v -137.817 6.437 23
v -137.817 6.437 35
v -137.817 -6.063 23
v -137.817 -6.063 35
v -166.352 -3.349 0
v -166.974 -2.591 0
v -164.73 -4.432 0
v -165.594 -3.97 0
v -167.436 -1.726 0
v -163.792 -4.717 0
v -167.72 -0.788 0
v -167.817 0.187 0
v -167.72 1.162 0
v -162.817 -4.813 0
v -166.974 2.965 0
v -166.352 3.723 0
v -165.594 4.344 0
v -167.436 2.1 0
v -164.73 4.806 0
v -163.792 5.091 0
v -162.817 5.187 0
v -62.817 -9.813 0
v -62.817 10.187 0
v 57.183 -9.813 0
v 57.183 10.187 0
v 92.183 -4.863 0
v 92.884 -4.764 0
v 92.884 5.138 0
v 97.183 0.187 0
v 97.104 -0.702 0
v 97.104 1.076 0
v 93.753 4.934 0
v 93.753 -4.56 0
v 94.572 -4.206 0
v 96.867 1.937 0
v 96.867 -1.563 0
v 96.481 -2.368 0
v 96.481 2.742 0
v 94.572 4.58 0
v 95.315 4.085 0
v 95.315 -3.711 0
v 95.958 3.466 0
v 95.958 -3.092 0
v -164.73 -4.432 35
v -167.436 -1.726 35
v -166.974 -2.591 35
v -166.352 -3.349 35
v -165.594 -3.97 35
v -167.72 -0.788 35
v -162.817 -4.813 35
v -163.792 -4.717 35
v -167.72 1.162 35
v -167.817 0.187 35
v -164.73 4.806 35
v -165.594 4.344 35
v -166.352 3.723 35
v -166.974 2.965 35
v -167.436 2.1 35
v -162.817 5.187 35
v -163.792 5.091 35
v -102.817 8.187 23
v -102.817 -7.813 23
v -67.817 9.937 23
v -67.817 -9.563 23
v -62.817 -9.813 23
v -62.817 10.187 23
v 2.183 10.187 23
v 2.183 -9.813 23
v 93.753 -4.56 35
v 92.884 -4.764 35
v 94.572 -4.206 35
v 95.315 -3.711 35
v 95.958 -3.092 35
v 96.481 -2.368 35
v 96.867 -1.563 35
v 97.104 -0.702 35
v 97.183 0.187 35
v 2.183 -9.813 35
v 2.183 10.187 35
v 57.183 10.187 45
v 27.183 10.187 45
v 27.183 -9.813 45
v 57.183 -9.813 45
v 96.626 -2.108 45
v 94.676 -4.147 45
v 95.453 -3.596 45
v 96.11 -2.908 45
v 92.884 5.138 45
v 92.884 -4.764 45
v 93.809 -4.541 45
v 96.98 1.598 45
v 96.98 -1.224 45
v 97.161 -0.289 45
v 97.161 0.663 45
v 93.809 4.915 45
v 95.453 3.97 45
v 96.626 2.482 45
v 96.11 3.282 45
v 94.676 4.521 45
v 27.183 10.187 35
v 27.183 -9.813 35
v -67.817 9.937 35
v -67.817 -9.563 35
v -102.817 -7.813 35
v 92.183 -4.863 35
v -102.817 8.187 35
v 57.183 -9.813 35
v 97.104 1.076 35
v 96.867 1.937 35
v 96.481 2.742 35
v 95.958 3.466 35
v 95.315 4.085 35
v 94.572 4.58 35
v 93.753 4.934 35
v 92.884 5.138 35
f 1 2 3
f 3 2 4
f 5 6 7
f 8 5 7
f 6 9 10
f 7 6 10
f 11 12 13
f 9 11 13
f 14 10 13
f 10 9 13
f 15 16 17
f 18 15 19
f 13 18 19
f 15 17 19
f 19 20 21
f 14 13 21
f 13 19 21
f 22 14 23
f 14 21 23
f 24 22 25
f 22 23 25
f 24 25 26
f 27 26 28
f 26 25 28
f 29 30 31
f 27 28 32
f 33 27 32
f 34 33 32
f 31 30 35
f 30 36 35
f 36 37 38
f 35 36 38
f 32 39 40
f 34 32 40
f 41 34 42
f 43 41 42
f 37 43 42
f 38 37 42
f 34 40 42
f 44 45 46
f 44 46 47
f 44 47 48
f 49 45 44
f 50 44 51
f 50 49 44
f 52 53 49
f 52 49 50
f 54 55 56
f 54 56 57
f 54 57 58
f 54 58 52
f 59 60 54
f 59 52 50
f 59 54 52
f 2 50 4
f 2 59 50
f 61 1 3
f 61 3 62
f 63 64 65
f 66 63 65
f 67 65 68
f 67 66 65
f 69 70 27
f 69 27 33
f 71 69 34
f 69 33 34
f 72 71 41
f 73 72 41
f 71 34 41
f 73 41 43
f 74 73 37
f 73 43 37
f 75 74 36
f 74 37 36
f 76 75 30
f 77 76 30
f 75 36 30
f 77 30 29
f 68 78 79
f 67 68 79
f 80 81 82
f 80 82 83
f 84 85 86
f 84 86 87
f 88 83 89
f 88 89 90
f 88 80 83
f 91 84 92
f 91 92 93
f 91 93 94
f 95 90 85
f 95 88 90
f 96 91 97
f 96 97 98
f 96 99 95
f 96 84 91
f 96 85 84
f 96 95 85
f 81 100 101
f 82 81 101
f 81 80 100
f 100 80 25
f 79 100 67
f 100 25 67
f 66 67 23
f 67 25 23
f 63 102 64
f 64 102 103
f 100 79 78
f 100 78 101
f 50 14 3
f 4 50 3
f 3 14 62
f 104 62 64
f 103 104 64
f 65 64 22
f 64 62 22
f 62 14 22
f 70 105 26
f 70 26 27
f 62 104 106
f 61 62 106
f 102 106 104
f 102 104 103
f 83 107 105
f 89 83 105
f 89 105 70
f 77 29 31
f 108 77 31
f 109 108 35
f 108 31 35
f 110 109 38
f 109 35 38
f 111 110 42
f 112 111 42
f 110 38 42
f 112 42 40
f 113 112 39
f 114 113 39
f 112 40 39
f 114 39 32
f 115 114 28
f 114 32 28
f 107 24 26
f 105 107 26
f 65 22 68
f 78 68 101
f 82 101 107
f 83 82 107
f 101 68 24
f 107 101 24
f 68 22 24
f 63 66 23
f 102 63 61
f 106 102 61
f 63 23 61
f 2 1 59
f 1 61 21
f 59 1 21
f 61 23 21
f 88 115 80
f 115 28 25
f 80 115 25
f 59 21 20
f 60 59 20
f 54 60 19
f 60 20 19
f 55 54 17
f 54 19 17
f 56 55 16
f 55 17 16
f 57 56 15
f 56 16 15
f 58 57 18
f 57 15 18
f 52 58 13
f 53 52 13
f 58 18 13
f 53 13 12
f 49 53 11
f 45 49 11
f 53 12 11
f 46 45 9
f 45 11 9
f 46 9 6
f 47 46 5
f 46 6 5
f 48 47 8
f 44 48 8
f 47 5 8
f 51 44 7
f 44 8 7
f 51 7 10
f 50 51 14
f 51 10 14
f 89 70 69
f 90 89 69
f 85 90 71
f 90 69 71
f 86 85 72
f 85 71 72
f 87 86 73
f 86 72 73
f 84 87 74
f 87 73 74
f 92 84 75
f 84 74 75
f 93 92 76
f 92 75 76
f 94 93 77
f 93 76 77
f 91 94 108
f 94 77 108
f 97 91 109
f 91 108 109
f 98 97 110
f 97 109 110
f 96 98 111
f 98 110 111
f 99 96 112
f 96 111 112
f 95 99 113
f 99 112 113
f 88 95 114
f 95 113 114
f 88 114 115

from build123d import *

# Parameters (mm, degrees)
F1_DEPTH = 35
F3_DEPTH = 10
F5_DEPTH = 12
F6_DEPTH = 12


with BuildPart() as f1:
    # F0 (on Top) → F1 (new body)
    with BuildSketch(Plane.XY):
        with BuildLine():
            Line((-62.8165142711, -9.8129920568), (57.1834857289, -9.8129920568))
            Line((57.1834857289, -9.8129920568), (92.1834857289, -4.8627543336))
            Line((92.1834857289, -4.8627543336), (92.8836937573, -4.7637201565))
            ThreePointArc((92.8836937573, -4.7637201565), (95.958471831, -3.0916320079), (97.1834857289, 0.1870079432))
            ThreePointArc((97.1834857289, 0.1870079432), (95.958471831, 3.4656478942), (92.8836937573, 5.1377360428))
            Line((92.8836937573, 5.1377360428), (57.1834857289, 10.1870079432))
            Line((57.1834857289, 10.1870079432), (-62.8165142711, 10.1870079432))
            Line((-62.8165142711, 10.1870079432), (-162.8165142711, 5.1870079432))
            ThreePointArc((-162.8165142711, 5.1870079432), (-167.8165142711, 0.1870079432), (-162.8165142711, -4.8129920568))
            Line((-162.8165142711, -4.8129920568), (-62.8165142711, -9.8129920568))
        make_face()
    extrude(amount=F1_DEPTH)

    # F2 (on face) → F3 (join)
    with BuildSketch(Plane.XY.offset(35)):
        with BuildLine():
            Line((57.1834857289, 10.1870079432), (27.1834857289, 10.1870079432))
            Line((27.1834857289, 10.1870079432), (27.1834857289, -9.8129920568))
            Line((27.1834857289, -9.8129920568), (57.1834857289, -9.8129920568))
            Line((57.1834857289, -9.8129920568), (92.8836937573, -4.7637201565))
            ThreePointArc((92.8836937573, -4.7637201565), (97.1834857289, 0.1870079432), (92.8836937573, 5.1377360428))
            Line((92.8836937573, 5.1377360428), (57.1834857289, 10.1870079432))
        make_face()
    extrude(amount=F3_DEPTH)

    # F4 (on face) → F5 (cut)
    with BuildSketch(Plane.XY.offset(35)):
        Polygon((2.1834857289, -9.8129920568), (2.1834857289, 10.1870079432), (-62.8165142711, 10.1870079432), (-67.8165142711, 9.9370079432), (-67.8165142711, -9.5629920568), (-62.8165142711, -9.8129920568), align=None)
    extrude(amount=-F5_DEPTH, mode=Mode.SUBTRACT)

    # F4 (on face) → F6 (cut)
    with BuildSketch(Plane.XY.offset(35)):
        Polygon((-102.8165142711, -7.8129920568), (-102.8165142711, 8.1870079432), (-137.8165142711, 6.4370079432), (-137.8165142711, -6.0629920568), align=None)
    extrude(amount=-F6_DEPTH, mode=Mode.SUBTRACT)


solid = f1.part
